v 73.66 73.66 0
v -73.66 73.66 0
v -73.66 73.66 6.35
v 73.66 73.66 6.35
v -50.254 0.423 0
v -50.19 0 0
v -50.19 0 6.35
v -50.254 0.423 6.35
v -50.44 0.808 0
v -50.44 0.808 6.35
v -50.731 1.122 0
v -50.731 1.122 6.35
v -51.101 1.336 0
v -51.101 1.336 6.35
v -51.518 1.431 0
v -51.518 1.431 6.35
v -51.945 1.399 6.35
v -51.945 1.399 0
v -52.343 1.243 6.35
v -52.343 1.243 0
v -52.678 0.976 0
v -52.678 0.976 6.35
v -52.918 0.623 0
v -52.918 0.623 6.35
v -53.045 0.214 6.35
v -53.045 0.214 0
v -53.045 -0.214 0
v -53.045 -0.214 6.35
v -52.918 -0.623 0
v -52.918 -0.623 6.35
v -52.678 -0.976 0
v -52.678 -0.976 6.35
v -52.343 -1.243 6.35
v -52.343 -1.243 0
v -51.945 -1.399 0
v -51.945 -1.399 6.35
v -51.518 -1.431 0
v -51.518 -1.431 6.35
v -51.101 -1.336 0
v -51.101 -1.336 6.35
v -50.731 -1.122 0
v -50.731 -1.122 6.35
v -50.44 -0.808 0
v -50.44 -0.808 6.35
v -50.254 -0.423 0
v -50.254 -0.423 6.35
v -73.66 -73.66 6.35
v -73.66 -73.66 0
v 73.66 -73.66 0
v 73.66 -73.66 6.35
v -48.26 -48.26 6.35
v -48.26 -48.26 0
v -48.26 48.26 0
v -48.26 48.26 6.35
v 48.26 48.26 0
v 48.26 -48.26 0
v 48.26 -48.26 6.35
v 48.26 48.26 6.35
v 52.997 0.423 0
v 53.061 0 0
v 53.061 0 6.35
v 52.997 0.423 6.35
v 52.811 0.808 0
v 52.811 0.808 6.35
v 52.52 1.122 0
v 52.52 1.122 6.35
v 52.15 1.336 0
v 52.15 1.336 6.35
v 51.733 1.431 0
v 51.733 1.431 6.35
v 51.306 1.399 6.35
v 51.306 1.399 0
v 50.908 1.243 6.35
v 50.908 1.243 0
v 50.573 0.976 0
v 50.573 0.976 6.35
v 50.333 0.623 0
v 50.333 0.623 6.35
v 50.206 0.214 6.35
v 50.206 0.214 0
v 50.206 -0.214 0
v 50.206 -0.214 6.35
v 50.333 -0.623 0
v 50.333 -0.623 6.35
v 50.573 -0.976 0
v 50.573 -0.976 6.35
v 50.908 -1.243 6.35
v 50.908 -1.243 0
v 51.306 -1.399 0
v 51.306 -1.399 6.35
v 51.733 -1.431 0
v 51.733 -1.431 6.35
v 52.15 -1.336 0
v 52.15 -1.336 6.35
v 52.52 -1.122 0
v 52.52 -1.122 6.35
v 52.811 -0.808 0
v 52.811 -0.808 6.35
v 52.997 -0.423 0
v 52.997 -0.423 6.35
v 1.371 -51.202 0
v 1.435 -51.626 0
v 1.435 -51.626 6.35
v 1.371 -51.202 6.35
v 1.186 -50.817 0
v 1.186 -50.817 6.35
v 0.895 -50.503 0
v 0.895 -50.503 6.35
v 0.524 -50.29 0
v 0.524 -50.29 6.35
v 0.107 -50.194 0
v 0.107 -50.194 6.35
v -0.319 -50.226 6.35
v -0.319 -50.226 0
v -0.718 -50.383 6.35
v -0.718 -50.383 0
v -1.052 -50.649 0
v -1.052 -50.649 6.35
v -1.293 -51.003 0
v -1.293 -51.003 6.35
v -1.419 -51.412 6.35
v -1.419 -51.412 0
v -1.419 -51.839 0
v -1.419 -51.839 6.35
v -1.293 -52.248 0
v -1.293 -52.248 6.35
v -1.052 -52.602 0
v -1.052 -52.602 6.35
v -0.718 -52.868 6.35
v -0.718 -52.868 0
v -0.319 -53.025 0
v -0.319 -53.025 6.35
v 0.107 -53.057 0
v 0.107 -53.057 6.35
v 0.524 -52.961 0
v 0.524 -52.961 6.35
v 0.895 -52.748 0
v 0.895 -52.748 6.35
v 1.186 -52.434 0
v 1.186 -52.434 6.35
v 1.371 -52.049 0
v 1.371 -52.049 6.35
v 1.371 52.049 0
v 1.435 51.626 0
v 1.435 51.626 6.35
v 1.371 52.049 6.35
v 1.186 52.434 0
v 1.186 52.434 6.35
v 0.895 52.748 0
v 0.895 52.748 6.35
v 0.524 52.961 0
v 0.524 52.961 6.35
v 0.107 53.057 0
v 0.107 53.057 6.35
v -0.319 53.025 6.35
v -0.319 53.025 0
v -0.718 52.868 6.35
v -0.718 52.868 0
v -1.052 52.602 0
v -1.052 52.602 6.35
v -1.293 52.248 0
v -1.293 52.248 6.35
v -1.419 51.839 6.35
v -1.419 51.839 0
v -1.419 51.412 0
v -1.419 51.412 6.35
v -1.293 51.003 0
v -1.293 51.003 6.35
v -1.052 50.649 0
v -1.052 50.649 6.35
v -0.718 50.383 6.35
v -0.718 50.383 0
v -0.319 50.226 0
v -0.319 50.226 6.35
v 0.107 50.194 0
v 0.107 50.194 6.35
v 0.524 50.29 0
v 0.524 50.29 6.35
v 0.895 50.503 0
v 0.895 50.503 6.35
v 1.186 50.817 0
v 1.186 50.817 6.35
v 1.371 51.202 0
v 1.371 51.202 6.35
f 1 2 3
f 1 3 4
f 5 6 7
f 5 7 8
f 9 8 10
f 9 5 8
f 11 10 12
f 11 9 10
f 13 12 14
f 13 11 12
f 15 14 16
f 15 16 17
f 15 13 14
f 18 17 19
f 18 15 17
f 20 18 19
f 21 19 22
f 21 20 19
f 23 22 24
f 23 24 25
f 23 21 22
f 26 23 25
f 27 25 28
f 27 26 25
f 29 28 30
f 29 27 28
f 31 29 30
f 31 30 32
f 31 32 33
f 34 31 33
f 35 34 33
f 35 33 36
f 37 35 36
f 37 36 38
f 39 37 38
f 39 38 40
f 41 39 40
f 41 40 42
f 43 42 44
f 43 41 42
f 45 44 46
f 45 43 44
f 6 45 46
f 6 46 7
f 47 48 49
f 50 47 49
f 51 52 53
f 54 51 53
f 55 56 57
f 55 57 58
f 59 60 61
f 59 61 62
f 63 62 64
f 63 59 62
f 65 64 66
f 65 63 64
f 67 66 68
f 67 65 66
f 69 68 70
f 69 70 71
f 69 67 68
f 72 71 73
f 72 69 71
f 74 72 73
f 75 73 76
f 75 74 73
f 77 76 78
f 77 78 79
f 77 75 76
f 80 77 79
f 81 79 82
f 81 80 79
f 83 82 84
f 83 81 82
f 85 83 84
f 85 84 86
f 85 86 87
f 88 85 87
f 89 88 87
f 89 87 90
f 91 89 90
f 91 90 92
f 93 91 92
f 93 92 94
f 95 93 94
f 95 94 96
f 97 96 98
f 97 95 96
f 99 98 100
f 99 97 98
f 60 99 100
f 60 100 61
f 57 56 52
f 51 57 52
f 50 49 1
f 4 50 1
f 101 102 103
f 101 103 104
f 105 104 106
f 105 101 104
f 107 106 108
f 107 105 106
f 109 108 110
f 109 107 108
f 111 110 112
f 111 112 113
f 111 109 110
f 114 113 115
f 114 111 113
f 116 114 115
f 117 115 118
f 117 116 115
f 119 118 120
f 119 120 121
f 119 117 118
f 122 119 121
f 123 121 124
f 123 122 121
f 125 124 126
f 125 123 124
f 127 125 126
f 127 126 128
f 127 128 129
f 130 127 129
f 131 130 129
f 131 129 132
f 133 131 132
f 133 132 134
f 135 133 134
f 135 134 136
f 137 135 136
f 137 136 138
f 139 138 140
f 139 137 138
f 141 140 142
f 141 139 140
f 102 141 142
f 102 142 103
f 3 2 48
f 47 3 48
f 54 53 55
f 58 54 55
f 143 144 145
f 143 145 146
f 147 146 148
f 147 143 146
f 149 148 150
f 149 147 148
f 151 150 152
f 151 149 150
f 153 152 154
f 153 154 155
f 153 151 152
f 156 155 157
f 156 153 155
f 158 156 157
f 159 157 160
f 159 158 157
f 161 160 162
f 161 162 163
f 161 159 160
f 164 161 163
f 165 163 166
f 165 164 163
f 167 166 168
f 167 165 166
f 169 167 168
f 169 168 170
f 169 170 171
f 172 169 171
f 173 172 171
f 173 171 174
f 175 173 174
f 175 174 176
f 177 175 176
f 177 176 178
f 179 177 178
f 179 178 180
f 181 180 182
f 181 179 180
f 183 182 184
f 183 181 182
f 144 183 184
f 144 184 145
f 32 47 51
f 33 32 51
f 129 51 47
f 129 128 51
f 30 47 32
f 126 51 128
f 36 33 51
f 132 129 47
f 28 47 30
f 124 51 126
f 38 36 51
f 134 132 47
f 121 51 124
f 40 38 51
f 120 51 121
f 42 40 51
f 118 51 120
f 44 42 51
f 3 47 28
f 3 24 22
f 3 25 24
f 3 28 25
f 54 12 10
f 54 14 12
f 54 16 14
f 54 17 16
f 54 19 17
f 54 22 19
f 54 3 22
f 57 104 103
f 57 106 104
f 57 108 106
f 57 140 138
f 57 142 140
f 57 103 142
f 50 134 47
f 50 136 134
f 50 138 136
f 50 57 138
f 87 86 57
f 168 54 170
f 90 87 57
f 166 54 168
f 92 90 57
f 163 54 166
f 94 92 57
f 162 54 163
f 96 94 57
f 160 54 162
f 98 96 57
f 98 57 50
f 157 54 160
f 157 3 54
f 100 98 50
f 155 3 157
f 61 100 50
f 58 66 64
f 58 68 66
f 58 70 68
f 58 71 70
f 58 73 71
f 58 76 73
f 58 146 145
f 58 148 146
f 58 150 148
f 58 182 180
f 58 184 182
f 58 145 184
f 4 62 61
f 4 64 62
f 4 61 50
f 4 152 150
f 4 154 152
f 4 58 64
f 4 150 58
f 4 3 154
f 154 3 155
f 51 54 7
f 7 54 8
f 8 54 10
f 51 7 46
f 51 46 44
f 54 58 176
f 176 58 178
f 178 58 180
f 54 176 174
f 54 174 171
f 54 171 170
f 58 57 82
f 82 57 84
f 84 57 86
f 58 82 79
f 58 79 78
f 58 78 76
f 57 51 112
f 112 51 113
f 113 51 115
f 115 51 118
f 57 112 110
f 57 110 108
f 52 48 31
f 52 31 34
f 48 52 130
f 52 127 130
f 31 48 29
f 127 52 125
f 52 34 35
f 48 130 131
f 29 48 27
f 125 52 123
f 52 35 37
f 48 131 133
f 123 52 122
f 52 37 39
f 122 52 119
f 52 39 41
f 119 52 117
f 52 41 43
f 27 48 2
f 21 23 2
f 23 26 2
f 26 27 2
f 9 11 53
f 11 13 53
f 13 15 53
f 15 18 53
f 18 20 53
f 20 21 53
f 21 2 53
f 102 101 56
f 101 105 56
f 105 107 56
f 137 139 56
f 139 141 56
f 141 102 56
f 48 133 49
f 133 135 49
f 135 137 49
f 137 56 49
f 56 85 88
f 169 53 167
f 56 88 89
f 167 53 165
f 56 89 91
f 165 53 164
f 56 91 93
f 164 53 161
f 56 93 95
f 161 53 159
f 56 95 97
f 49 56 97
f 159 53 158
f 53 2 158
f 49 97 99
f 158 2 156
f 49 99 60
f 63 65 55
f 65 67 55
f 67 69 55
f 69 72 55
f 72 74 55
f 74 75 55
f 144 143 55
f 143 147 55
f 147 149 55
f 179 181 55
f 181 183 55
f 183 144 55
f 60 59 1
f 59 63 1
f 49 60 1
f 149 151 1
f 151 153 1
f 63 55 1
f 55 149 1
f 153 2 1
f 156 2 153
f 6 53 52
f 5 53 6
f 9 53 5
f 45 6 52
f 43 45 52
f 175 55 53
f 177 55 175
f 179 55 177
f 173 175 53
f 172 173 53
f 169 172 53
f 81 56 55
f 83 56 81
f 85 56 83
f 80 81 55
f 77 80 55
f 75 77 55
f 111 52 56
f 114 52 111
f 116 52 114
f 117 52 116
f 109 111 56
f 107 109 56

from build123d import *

# Parameters (mm, degrees)
SKETCH1_W           = 147.32
SKETCH1_H           = 25.4
SKETCH1_R           = 1.4351
SKETCH1_W_2         = 25.4
SKETCH1_H_2         = 96.52
BOSS_EXTRUDE1_DEPTH = 6.35


with BuildPart() as part:
    # Sketch1 → Boss-Extrude1 (new body)
    with BuildSketch(Plane.XY):
        with Locations((0, 60.96)):
            Rectangle(SKETCH1_W, SKETCH1_H)
        with Locations((0, 51.6255)):
            Circle(SKETCH1_R, mode=Mode.SUBTRACT)
        with Locations((-60.96, 0)):
            Rectangle(SKETCH1_W_2, SKETCH1_H_2)
        with Locations((-51.6255, 0)):
            Circle(SKETCH1_R, mode=Mode.SUBTRACT)
        with Locations((60.96, 0)):
            Rectangle(SKETCH1_W_2, SKETCH1_H_2)
        with Locations((51.6255, 0)):
            Circle(SKETCH1_R, mode=Mode.SUBTRACT)
        Polygon((-48.26, -48.26), (-73.66, -48.26), (-73.66, -73.66), (73.66, -73.66), (73.66, -48.26), (48.26, -48.26), align=None)
        with Locations((0, -51.6255)):
            Circle(SKETCH1_R, mode=Mode.SUBTRACT)
    extrude(amount=BOSS_EXTRUDE1_DEPTH)


solid = part.part
